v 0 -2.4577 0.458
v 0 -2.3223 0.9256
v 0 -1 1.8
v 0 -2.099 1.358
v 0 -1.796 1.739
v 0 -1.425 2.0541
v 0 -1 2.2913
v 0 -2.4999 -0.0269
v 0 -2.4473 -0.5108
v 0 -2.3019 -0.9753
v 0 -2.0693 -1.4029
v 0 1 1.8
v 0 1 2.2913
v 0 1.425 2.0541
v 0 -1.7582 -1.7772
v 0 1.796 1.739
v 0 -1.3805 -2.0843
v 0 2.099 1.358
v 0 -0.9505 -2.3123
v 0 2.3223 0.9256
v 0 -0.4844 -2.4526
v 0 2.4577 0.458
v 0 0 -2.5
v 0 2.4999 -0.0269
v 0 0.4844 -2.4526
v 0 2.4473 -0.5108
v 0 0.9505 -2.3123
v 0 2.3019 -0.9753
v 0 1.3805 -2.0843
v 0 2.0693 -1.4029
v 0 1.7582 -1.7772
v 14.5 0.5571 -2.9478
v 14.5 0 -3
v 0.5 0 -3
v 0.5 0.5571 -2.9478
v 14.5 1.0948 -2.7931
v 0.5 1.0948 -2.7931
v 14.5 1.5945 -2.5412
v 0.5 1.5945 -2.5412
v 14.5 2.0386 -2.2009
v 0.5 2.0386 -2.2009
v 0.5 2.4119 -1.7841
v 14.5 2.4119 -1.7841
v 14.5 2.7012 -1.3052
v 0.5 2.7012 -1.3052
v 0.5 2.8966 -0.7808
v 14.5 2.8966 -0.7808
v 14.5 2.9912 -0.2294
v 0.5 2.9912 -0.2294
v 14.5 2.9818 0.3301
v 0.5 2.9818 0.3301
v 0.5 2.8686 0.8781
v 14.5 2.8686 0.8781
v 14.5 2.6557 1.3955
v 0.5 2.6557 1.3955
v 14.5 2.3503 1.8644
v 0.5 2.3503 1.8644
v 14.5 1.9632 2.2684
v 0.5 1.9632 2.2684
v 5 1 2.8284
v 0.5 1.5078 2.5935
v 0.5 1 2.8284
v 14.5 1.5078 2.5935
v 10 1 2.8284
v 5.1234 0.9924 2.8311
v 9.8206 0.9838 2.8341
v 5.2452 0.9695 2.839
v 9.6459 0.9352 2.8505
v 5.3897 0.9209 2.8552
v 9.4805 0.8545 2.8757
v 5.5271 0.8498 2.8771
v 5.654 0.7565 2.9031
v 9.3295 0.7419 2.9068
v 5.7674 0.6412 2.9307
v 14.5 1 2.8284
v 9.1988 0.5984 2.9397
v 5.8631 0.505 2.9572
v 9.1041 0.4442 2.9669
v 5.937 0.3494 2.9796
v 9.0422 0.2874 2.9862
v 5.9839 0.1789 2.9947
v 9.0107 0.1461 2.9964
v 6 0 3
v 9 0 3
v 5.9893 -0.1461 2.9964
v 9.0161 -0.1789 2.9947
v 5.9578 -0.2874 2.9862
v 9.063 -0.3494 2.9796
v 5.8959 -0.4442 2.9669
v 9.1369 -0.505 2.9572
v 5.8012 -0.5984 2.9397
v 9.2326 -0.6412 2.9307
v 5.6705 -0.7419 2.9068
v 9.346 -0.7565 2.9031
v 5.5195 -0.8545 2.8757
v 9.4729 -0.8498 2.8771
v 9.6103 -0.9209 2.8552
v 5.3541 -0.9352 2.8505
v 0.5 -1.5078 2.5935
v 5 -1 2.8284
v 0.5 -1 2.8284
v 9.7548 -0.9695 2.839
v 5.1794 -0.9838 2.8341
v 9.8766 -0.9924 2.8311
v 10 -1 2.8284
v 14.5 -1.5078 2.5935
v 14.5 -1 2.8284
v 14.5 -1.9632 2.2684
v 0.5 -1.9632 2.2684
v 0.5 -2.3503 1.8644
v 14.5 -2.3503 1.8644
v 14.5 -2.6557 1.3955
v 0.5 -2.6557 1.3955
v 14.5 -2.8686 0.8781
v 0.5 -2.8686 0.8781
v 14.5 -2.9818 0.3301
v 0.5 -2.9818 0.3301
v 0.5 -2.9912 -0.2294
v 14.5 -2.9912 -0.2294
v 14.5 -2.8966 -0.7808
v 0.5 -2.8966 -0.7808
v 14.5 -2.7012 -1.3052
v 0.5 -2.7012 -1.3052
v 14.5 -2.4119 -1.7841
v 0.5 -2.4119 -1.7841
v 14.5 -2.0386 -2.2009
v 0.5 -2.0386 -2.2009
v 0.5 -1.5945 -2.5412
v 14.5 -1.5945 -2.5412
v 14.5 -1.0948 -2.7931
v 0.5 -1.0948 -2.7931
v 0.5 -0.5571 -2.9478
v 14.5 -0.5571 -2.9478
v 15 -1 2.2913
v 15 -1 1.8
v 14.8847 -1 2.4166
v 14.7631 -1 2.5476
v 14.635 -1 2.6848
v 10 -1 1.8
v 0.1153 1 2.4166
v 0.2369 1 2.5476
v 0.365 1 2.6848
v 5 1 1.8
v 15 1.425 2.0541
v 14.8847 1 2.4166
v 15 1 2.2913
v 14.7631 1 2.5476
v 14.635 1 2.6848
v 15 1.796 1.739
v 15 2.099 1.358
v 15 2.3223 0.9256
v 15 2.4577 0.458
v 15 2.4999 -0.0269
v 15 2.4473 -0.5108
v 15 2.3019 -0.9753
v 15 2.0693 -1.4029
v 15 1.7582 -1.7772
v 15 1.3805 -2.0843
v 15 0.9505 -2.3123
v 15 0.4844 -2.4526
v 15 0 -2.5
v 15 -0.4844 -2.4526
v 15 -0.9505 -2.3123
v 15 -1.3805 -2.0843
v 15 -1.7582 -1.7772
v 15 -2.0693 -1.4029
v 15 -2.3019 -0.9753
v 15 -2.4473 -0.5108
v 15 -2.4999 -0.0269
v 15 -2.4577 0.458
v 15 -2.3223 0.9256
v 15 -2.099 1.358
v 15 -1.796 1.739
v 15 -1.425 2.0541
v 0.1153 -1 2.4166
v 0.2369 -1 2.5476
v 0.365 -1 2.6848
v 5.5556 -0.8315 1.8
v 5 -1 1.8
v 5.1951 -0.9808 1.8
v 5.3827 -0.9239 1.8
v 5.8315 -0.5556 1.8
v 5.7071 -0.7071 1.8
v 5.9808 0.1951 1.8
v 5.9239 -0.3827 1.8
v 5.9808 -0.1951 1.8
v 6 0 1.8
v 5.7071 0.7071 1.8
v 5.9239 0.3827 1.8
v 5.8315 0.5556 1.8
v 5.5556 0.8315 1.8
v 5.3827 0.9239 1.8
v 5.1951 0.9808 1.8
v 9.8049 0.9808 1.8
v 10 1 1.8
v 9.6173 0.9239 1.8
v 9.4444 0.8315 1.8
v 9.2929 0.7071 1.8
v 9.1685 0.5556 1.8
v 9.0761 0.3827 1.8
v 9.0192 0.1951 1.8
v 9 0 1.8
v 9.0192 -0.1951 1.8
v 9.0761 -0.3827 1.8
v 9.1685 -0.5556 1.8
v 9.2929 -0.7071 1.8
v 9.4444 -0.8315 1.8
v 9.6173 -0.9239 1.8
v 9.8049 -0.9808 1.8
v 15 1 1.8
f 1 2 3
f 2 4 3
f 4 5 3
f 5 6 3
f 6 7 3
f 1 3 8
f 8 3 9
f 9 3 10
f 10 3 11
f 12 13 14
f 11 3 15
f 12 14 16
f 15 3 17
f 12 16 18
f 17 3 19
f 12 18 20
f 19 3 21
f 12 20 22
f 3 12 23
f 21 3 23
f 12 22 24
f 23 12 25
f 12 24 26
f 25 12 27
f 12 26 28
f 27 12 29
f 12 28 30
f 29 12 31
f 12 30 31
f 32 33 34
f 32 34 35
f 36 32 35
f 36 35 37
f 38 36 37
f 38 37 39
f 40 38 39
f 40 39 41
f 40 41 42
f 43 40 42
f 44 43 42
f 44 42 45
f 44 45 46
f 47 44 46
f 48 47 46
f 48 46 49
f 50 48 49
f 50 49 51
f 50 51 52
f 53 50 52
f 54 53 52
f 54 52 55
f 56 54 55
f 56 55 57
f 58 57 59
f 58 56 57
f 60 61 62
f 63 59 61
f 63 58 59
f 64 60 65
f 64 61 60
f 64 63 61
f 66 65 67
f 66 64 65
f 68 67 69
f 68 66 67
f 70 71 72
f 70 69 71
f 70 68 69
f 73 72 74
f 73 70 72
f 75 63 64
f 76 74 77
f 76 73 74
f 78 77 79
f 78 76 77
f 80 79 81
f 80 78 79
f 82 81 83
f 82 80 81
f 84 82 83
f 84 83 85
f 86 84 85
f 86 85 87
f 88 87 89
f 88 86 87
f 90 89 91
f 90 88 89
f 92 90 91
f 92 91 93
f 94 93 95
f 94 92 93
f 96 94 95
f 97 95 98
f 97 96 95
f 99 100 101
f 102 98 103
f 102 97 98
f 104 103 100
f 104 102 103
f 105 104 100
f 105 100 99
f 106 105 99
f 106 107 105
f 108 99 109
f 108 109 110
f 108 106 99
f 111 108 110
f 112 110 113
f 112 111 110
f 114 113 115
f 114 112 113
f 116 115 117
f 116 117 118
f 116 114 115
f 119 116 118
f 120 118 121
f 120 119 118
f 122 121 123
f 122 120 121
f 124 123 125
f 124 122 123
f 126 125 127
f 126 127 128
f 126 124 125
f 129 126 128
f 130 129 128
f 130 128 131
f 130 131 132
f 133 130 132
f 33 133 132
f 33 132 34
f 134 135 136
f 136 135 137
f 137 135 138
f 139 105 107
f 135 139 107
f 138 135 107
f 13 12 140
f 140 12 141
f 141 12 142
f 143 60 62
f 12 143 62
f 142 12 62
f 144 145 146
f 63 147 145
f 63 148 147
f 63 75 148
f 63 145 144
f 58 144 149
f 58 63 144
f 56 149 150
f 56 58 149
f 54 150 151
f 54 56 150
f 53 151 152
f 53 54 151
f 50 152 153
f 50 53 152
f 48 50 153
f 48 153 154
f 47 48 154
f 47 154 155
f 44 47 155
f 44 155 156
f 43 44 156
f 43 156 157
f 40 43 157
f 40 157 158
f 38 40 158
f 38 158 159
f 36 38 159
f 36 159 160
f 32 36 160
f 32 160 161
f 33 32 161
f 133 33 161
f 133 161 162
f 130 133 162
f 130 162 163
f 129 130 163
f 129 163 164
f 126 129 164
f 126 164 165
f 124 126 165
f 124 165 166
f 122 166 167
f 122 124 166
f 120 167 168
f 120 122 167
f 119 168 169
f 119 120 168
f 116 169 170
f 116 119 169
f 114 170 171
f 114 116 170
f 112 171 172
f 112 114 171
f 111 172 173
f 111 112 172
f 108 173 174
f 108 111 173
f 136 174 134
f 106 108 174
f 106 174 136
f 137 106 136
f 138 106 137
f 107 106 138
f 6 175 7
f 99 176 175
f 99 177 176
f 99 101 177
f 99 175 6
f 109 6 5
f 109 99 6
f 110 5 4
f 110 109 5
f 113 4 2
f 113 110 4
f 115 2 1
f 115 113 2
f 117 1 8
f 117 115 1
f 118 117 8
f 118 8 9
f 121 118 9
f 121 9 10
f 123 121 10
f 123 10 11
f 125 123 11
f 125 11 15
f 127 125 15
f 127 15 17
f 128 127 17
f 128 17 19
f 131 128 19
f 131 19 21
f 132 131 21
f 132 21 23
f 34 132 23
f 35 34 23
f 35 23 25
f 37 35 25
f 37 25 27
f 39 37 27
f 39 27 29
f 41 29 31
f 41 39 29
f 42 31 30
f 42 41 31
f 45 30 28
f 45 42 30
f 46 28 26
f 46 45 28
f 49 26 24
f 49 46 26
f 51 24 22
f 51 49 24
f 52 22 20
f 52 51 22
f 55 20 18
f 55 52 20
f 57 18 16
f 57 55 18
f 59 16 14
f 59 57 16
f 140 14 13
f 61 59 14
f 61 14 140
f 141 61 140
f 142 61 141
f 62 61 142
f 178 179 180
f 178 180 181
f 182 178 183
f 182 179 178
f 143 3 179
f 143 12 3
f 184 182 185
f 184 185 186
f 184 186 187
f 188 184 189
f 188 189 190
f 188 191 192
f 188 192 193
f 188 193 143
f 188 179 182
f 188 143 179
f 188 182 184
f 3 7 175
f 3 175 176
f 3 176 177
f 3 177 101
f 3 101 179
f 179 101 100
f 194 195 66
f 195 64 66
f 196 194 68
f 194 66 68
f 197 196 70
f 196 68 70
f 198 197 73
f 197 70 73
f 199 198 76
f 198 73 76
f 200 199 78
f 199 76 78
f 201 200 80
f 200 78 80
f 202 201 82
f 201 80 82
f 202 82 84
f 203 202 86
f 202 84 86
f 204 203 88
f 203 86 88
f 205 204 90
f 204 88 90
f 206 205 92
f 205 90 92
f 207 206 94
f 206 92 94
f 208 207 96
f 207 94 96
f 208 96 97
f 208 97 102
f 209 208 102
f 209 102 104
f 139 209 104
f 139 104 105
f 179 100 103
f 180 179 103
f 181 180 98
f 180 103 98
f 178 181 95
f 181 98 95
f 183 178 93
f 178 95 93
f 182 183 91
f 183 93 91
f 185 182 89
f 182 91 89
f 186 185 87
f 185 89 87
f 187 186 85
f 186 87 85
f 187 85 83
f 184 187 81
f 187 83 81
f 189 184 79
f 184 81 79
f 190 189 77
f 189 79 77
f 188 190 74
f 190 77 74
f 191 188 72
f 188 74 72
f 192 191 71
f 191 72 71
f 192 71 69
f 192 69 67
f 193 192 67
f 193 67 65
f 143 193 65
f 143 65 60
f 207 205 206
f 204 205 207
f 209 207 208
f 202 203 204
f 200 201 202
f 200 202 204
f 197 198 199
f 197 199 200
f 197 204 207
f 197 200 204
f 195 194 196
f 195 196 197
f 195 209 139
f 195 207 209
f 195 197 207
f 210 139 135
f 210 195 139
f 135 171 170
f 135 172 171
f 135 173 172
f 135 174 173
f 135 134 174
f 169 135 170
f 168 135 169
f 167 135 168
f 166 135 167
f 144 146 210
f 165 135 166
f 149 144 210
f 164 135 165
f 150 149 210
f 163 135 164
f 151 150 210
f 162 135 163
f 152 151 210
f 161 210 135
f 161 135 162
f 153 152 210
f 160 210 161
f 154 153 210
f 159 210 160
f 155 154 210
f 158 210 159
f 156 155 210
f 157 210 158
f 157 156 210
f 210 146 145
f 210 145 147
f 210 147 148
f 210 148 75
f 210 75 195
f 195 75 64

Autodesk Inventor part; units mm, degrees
ref_plane "YZ Plane" through (0, 0, 0) normal (1, 0, 0) x (0, 1, 0)
ref_plane "XZ Plane" through (0, 0, 0) normal (0, 1, 0) x (-1, 0, 0)
ref_plane "XY Plane" through (0, 0, 0) normal (0, 0, 1) x (1, 0, 0)
sketch "Sketch_1" plane through (0, 0, 0) normal (0, 1, 0) x (-1, 0, 0)
  line L0 (-15, 0) -> (0, 0)
  line L1 (0, 0) -> (0, -2.5)
  line L2 (0, -2.5) -> (-0.5, -3)
  line L3 (-0.5, -3) -> (-14.5, -3)
  line L4 (-14.5, -3) -> (-15, -2.5)
  line L5 (-15, -2.5) -> (-15, 0)
  line L6 (-15, 0) -> (0, 0)
revolve "Revolution1" add sketch "Sketch_1" angle 360 about axis through (15, 0, 0) along (1, 0, 0)
sketch "_____9" plane through (0, 0, 3) normal (0, 0, 1) x (1, 0, 0)
  line L0 (0, 1) -> (0, -1)
  line L1 (0, -1) -> (5, -1)
  arc A0 (5, -1) -> (5, 1) centre (5, 0) ccw
  line L2 (5, 1) -> (0, 1)
extrude "Extrusion1" cut sketch "_____9" against normal blind 1.2
sketch "_____14" plane through (0, 0, 3) normal (0, 0, 1) x (1, 0, 0)
  arc A0 (10, 1) -> (10, -1) centre (10, 0) ccw
  line L0 (10, -1) -> (15, -1)
  line L1 (15, -1) -> (15, 1)
  line L2 (15, 1) -> (10, 1)
extrude "Extrusion2" cut sketch "_____14" against normal blind 1.2
properties part number "SSFHKR6-15-KA0-A6-KB9-B6_s"
